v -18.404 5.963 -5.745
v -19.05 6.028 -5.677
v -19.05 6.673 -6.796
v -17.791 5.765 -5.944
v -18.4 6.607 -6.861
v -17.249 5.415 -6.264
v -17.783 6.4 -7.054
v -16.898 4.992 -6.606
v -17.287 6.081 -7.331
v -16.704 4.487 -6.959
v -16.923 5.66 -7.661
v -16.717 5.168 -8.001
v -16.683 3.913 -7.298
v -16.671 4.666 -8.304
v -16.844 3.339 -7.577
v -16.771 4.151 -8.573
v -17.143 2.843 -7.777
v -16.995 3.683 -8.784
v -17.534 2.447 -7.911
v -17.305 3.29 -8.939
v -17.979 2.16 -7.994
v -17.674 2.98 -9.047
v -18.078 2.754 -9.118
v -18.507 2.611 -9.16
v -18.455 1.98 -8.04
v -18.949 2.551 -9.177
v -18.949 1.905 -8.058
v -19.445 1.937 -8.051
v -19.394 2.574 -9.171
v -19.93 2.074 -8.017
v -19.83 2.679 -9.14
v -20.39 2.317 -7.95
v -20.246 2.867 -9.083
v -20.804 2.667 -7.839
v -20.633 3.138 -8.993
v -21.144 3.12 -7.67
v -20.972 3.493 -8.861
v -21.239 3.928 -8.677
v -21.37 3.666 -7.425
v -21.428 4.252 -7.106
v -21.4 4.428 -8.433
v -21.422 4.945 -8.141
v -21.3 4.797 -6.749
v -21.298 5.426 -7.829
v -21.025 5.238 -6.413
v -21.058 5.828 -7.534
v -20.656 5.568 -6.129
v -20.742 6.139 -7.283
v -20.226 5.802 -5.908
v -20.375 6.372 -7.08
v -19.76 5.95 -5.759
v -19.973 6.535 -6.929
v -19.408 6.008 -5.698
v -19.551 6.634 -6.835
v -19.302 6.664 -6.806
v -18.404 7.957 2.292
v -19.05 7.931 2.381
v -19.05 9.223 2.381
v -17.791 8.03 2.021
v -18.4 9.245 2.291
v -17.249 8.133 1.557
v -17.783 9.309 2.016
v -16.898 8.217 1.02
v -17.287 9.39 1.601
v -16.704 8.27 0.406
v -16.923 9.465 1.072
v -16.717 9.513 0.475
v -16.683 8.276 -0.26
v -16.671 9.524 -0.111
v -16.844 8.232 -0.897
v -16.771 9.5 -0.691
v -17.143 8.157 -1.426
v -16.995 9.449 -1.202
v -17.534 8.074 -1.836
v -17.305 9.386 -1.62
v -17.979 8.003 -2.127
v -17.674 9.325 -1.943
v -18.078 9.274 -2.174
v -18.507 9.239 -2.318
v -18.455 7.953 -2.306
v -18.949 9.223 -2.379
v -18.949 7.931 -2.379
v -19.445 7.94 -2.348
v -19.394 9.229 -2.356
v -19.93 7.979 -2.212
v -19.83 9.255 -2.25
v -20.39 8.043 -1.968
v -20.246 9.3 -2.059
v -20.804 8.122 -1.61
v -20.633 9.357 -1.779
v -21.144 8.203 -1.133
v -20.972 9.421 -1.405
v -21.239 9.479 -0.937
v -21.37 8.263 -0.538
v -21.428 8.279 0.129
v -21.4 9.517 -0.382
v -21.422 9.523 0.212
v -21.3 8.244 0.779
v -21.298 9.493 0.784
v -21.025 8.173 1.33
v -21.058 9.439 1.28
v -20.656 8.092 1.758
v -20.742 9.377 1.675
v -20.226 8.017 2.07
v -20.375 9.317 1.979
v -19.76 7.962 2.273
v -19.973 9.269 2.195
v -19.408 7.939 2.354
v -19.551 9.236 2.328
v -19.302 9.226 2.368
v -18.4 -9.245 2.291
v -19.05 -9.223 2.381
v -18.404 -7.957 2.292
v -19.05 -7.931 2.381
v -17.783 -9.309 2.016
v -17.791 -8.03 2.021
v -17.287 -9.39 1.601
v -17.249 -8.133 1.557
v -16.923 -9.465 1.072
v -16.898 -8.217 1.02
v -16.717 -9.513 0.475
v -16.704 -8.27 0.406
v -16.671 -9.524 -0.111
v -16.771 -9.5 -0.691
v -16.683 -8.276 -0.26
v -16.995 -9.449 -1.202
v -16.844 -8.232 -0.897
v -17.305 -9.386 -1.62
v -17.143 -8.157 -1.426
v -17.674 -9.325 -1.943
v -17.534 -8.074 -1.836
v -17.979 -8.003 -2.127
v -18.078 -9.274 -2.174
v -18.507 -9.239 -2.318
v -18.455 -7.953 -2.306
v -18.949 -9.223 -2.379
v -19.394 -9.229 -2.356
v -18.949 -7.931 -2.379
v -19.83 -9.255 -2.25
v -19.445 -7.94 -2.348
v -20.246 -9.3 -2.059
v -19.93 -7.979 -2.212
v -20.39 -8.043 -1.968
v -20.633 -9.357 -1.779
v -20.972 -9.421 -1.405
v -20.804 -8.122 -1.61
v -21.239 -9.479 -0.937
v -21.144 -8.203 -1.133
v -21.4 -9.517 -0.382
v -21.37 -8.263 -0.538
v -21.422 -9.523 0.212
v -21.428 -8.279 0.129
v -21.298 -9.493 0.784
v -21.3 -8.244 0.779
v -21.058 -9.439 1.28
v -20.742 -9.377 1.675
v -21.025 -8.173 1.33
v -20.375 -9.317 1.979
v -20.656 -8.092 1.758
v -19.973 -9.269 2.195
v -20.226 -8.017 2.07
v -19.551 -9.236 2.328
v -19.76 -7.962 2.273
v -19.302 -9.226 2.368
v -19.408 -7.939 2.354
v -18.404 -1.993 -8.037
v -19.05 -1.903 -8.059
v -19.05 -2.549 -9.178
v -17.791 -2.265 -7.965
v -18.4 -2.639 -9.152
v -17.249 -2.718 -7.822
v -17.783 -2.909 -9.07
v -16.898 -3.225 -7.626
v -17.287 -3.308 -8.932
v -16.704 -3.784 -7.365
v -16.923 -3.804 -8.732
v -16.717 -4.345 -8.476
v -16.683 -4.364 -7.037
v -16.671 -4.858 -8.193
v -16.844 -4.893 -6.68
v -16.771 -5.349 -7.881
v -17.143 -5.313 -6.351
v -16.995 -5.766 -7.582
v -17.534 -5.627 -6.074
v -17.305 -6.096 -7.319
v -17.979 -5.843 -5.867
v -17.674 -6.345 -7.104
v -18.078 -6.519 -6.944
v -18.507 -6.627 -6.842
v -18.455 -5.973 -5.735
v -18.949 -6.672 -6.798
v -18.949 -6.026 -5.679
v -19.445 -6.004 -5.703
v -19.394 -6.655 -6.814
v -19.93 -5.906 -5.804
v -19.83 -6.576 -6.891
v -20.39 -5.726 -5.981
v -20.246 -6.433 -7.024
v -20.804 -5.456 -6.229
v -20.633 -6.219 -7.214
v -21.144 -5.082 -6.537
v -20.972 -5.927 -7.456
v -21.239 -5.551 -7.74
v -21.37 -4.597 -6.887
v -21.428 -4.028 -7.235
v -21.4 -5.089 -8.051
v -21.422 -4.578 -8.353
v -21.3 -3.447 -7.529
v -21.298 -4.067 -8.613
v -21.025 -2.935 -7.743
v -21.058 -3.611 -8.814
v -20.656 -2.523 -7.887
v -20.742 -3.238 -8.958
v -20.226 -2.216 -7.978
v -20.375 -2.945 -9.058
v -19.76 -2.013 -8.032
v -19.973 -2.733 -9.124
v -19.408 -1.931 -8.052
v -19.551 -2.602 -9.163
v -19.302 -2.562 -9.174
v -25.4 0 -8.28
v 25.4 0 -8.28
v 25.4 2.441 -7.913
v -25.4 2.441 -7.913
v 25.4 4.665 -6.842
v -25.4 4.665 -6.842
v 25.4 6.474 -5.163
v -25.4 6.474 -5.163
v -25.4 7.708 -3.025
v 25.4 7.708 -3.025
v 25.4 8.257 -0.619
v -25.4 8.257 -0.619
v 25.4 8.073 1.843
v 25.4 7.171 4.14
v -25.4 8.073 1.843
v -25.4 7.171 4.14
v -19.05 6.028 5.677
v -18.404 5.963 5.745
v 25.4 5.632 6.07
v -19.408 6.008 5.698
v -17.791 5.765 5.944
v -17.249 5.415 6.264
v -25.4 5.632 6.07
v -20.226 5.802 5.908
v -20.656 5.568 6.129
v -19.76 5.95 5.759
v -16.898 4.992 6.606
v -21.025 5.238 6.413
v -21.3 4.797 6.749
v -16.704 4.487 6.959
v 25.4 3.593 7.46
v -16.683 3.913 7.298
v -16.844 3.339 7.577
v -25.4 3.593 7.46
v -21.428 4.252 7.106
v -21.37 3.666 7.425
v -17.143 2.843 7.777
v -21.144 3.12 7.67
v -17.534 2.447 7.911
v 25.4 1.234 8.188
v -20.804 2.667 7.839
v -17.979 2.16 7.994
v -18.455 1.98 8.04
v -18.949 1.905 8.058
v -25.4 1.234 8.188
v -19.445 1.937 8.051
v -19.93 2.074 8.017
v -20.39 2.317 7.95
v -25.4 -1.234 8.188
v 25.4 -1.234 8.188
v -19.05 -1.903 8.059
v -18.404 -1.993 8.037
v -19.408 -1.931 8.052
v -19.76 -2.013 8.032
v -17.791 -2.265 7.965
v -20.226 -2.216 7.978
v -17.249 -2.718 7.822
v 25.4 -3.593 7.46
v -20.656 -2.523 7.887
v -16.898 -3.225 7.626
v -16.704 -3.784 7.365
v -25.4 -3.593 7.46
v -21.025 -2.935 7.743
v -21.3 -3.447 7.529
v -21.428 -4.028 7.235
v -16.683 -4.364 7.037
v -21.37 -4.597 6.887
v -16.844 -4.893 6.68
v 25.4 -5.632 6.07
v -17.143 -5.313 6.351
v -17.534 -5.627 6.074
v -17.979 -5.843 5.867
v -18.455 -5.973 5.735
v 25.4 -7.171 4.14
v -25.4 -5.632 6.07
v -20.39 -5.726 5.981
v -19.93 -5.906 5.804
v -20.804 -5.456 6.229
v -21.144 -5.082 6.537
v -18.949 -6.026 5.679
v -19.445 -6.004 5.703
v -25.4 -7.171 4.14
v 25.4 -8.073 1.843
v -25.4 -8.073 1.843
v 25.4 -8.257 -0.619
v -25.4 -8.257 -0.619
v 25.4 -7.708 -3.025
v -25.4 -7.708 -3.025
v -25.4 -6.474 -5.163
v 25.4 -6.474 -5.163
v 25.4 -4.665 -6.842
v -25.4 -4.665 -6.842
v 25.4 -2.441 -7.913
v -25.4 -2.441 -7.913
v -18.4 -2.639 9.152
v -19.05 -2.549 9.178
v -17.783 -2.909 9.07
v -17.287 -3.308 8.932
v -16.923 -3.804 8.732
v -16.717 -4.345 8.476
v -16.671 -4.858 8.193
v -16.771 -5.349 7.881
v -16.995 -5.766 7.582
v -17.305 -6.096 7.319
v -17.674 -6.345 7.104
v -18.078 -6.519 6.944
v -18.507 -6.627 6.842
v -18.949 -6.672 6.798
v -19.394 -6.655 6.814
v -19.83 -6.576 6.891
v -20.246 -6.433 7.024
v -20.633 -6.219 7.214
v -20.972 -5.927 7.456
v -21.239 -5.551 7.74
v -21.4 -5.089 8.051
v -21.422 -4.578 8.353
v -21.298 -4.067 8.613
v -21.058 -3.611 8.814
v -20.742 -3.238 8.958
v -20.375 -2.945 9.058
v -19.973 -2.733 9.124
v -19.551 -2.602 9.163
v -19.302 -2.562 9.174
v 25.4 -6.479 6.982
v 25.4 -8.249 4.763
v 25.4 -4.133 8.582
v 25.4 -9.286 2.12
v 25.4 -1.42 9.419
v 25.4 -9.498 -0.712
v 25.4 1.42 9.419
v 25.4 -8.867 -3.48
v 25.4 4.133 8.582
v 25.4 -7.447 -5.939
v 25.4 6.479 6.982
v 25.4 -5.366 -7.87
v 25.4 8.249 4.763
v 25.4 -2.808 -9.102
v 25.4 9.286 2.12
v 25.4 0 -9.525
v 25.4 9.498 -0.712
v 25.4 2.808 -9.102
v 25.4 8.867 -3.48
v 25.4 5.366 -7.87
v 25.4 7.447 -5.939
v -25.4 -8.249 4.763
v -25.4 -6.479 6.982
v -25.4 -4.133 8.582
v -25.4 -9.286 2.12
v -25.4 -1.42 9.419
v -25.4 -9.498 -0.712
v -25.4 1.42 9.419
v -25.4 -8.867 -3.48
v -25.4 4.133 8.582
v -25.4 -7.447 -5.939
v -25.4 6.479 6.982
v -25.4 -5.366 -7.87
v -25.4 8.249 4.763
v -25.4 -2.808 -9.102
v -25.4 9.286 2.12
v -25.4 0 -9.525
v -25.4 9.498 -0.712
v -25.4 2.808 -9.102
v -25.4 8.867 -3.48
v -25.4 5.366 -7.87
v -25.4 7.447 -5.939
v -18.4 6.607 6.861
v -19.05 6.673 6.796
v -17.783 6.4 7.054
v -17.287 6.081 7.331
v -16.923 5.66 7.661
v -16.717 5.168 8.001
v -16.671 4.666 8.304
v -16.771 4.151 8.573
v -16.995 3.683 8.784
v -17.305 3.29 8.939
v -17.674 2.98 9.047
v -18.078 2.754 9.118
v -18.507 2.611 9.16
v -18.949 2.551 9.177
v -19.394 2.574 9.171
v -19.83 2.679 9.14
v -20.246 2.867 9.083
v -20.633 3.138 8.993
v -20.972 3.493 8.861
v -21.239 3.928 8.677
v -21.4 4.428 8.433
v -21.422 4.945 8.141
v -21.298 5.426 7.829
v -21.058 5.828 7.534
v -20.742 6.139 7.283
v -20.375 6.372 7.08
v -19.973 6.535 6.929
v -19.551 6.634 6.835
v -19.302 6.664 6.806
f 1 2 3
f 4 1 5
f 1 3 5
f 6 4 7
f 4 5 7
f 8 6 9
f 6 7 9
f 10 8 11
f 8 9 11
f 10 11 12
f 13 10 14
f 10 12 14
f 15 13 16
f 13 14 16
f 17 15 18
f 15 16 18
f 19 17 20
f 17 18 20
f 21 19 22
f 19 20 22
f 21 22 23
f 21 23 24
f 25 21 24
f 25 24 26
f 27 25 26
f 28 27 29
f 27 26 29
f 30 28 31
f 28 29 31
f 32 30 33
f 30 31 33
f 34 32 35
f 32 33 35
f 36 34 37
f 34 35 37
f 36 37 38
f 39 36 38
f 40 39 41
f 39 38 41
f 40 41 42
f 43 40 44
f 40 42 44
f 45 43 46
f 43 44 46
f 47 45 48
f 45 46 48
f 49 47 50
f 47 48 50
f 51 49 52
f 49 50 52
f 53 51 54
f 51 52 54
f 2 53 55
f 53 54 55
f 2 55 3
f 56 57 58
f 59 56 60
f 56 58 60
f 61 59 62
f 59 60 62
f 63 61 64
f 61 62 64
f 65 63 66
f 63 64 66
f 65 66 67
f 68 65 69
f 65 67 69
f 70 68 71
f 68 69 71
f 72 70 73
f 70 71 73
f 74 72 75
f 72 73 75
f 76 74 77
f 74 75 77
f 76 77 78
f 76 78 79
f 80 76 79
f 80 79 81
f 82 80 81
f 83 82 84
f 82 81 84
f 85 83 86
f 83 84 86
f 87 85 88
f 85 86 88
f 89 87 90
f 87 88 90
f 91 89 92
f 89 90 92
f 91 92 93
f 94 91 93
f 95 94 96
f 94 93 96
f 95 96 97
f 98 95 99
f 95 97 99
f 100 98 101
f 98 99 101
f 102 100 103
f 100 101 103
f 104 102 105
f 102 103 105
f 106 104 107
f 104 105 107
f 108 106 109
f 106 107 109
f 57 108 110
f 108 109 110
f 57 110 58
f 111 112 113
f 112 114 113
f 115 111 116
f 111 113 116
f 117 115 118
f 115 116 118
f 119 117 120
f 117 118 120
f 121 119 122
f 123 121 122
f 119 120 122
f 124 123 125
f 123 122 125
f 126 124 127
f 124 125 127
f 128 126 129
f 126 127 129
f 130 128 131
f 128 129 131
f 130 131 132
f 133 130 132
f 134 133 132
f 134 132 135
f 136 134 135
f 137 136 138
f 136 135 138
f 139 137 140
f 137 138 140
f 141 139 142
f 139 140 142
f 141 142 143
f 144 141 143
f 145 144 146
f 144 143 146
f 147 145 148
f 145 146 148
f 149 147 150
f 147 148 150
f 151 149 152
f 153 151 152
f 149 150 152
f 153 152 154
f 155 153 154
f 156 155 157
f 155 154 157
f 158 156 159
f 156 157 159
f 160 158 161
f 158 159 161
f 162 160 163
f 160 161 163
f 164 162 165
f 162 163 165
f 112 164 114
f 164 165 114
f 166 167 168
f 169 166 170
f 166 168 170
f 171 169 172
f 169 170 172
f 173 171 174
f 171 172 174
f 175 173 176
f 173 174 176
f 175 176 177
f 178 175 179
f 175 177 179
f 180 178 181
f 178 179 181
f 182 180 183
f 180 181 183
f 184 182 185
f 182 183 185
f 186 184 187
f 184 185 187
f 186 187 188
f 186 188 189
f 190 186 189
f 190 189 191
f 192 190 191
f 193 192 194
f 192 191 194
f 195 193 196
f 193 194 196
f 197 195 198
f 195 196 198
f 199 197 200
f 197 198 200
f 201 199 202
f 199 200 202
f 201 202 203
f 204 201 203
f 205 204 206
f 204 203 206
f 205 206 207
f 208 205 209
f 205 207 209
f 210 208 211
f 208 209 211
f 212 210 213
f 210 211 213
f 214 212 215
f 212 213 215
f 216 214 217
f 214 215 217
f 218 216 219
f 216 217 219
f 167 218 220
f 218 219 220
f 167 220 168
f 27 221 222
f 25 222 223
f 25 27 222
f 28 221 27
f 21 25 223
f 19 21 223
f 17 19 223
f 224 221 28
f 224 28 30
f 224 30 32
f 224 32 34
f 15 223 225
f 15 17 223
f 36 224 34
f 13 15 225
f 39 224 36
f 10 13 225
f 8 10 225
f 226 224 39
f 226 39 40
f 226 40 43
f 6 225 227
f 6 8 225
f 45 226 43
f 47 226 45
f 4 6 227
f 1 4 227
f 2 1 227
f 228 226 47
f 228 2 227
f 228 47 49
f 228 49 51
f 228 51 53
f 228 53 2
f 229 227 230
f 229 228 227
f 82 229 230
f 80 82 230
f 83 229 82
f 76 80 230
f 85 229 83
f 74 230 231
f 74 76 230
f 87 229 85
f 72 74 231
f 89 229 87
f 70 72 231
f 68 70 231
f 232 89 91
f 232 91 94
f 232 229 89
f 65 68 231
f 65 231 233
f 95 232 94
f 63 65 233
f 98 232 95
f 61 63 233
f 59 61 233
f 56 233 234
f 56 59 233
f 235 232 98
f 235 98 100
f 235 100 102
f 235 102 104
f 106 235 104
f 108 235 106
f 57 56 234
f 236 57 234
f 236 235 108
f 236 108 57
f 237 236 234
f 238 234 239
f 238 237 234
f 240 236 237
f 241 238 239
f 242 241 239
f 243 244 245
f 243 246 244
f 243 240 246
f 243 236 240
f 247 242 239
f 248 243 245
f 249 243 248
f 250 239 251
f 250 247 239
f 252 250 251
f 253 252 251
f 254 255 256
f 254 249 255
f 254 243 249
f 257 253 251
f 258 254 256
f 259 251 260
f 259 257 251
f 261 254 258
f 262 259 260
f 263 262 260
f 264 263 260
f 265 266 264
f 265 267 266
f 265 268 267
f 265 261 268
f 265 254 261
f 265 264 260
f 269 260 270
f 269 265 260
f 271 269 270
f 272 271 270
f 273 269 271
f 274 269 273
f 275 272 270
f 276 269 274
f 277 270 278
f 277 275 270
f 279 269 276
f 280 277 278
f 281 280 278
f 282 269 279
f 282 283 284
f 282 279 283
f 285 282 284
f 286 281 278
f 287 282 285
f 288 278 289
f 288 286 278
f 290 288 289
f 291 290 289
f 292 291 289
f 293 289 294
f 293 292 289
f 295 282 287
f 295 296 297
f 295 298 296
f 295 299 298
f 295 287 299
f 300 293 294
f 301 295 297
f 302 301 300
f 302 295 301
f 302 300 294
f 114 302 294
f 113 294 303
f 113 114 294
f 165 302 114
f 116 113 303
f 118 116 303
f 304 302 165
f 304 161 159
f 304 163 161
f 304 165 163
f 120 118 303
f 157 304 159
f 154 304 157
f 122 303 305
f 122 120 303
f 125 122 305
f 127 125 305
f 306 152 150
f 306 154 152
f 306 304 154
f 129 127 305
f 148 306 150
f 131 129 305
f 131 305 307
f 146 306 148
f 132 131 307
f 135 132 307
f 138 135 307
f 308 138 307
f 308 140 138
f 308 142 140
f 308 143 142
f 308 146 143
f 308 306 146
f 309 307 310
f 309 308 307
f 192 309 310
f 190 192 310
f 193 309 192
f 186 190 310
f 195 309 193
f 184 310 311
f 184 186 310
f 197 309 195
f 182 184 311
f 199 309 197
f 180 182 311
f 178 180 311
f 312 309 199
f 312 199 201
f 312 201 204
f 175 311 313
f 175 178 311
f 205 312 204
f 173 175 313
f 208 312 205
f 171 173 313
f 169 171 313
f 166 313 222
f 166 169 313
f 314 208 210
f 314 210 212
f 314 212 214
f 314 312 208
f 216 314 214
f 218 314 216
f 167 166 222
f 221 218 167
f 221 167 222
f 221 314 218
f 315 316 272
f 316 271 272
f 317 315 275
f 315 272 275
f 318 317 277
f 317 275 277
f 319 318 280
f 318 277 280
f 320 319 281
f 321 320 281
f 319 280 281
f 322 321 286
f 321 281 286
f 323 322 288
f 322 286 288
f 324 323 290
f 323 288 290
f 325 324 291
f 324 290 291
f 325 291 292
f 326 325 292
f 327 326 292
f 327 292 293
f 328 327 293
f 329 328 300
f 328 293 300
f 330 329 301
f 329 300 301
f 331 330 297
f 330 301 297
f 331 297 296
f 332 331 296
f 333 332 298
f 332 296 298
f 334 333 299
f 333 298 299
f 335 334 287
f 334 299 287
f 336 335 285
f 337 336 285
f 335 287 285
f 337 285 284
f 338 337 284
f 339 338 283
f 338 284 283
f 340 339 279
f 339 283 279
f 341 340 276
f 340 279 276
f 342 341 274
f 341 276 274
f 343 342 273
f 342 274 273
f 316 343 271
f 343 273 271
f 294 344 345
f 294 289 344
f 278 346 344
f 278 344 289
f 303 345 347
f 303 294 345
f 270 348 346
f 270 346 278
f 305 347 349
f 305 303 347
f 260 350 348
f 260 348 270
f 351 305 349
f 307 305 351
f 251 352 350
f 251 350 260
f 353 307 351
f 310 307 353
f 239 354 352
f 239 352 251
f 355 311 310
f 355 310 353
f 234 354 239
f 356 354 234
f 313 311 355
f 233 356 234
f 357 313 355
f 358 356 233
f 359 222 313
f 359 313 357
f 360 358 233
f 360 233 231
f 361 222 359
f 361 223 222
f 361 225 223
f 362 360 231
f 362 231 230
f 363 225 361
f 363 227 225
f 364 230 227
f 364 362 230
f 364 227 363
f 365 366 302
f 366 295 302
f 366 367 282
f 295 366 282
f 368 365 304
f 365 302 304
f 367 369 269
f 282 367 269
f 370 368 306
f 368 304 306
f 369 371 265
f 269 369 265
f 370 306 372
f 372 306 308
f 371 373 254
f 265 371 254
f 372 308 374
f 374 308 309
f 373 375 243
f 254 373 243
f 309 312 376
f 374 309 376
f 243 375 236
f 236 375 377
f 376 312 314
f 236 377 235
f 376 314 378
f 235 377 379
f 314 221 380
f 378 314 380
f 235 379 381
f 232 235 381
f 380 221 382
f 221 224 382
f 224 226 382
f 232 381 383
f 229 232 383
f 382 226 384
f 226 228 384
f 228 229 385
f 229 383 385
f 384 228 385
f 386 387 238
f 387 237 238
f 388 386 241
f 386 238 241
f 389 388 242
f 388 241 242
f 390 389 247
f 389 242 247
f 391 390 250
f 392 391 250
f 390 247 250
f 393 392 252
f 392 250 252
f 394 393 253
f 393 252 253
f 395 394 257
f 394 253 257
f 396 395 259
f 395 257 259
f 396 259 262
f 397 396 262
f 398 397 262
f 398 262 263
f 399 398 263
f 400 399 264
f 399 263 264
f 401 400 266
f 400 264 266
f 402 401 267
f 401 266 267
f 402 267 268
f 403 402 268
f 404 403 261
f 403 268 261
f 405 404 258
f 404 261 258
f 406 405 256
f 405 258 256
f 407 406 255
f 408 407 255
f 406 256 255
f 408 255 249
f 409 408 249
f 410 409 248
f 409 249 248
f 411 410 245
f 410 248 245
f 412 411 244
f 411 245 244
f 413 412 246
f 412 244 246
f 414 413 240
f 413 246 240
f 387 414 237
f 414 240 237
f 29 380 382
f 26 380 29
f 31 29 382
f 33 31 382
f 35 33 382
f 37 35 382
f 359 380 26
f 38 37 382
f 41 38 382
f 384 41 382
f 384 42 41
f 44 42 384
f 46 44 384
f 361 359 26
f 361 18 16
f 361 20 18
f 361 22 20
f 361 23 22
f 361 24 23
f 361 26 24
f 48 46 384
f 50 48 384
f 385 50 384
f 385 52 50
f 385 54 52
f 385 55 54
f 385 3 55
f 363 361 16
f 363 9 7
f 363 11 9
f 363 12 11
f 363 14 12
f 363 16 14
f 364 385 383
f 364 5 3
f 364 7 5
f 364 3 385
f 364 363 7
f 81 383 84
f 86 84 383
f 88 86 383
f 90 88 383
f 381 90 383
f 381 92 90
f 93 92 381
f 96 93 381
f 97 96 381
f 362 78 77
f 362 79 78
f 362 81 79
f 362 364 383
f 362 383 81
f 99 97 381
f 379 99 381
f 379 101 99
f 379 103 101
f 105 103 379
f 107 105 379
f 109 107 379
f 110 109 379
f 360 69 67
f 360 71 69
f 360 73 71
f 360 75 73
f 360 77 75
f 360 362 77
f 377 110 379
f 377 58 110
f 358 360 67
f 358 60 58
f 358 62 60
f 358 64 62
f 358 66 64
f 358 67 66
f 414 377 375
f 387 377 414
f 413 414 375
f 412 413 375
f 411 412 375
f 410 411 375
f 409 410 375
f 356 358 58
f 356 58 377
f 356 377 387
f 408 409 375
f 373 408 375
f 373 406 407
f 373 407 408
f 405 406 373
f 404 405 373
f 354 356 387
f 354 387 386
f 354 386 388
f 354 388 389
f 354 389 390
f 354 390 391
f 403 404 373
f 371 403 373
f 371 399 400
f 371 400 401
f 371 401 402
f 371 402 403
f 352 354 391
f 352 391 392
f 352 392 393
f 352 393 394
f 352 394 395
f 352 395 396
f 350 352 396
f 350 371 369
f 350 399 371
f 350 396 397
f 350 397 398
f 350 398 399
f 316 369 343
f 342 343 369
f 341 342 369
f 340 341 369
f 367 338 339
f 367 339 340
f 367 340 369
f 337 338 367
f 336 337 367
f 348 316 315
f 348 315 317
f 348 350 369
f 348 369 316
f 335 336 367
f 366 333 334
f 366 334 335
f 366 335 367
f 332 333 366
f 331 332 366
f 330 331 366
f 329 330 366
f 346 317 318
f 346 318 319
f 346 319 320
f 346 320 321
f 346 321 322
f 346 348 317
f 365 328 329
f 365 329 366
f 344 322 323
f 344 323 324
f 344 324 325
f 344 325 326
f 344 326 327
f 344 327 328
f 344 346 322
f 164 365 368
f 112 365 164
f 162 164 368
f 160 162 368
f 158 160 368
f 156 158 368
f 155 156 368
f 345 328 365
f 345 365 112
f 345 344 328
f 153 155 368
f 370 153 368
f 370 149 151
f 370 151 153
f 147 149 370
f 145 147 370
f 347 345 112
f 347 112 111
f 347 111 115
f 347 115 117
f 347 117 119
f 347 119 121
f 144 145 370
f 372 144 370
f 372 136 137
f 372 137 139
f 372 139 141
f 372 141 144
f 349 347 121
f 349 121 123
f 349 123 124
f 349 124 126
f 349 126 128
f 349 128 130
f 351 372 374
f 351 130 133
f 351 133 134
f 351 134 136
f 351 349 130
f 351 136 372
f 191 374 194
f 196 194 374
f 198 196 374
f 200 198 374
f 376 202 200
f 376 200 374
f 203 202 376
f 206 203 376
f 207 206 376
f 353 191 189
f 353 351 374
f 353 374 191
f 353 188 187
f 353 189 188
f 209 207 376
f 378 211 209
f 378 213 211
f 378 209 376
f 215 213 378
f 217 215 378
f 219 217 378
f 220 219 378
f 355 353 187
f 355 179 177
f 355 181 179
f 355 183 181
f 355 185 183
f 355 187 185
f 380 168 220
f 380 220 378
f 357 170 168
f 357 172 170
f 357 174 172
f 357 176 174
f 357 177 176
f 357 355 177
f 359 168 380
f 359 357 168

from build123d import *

# Parameters (mm, degrees)
SKETCH1_R          = 9.525
SKETCH1_R_2        = 8.2804
EXTRUDE1_DEPTH     = 25.4
SKETCH2_R          = 2.38125
CUT_EXTRUDE1_DEPTH = 29.750847814
CIRPATTERN1_COUNT  = 3
CIRPATTERN1_ANGLE  = 120


with BuildPart() as part:
    # Sketch1 → Extrude1 (new, symmetric)
    with BuildSketch(Plane(origin=(0, 0, 0), x_dir=(0, 0, -1), z_dir=(1, 0, 0))):
        Circle(SKETCH1_R)
        Circle(SKETCH1_R_2, mode=Mode.SUBTRACT)
    extrude(amount=EXTRUDE1_DEPTH, both=True)

    # Sketch2 → Cut-Extrude1 (cut, symmetric)
    with BuildSketch(Plane(origin=(0, 0, 0), x_dir=(1, 0, 0), z_dir=(0, 1, 0))):
        with Locations(Location((-19.05, 0, 0), (0, 0, 270))):
            Circle(SKETCH2_R)
    cut_extrude1 = extrude(amount=CUT_EXTRUDE1_DEPTH, both=True, mode=Mode.SUBTRACT)

    # CirPattern1: Cut-Extrude1 ×3 about axis
    cirpattern1_axis = Axis((25.4, 0, 0), (-1, 0, 0))
    for i in range(1, CIRPATTERN1_COUNT):
        add(cut_extrude1.rotate(cirpattern1_axis, i * CIRPATTERN1_ANGLE / (CIRPATTERN1_COUNT - 1)), mode=Mode.SUBTRACT)


solid = part.part
